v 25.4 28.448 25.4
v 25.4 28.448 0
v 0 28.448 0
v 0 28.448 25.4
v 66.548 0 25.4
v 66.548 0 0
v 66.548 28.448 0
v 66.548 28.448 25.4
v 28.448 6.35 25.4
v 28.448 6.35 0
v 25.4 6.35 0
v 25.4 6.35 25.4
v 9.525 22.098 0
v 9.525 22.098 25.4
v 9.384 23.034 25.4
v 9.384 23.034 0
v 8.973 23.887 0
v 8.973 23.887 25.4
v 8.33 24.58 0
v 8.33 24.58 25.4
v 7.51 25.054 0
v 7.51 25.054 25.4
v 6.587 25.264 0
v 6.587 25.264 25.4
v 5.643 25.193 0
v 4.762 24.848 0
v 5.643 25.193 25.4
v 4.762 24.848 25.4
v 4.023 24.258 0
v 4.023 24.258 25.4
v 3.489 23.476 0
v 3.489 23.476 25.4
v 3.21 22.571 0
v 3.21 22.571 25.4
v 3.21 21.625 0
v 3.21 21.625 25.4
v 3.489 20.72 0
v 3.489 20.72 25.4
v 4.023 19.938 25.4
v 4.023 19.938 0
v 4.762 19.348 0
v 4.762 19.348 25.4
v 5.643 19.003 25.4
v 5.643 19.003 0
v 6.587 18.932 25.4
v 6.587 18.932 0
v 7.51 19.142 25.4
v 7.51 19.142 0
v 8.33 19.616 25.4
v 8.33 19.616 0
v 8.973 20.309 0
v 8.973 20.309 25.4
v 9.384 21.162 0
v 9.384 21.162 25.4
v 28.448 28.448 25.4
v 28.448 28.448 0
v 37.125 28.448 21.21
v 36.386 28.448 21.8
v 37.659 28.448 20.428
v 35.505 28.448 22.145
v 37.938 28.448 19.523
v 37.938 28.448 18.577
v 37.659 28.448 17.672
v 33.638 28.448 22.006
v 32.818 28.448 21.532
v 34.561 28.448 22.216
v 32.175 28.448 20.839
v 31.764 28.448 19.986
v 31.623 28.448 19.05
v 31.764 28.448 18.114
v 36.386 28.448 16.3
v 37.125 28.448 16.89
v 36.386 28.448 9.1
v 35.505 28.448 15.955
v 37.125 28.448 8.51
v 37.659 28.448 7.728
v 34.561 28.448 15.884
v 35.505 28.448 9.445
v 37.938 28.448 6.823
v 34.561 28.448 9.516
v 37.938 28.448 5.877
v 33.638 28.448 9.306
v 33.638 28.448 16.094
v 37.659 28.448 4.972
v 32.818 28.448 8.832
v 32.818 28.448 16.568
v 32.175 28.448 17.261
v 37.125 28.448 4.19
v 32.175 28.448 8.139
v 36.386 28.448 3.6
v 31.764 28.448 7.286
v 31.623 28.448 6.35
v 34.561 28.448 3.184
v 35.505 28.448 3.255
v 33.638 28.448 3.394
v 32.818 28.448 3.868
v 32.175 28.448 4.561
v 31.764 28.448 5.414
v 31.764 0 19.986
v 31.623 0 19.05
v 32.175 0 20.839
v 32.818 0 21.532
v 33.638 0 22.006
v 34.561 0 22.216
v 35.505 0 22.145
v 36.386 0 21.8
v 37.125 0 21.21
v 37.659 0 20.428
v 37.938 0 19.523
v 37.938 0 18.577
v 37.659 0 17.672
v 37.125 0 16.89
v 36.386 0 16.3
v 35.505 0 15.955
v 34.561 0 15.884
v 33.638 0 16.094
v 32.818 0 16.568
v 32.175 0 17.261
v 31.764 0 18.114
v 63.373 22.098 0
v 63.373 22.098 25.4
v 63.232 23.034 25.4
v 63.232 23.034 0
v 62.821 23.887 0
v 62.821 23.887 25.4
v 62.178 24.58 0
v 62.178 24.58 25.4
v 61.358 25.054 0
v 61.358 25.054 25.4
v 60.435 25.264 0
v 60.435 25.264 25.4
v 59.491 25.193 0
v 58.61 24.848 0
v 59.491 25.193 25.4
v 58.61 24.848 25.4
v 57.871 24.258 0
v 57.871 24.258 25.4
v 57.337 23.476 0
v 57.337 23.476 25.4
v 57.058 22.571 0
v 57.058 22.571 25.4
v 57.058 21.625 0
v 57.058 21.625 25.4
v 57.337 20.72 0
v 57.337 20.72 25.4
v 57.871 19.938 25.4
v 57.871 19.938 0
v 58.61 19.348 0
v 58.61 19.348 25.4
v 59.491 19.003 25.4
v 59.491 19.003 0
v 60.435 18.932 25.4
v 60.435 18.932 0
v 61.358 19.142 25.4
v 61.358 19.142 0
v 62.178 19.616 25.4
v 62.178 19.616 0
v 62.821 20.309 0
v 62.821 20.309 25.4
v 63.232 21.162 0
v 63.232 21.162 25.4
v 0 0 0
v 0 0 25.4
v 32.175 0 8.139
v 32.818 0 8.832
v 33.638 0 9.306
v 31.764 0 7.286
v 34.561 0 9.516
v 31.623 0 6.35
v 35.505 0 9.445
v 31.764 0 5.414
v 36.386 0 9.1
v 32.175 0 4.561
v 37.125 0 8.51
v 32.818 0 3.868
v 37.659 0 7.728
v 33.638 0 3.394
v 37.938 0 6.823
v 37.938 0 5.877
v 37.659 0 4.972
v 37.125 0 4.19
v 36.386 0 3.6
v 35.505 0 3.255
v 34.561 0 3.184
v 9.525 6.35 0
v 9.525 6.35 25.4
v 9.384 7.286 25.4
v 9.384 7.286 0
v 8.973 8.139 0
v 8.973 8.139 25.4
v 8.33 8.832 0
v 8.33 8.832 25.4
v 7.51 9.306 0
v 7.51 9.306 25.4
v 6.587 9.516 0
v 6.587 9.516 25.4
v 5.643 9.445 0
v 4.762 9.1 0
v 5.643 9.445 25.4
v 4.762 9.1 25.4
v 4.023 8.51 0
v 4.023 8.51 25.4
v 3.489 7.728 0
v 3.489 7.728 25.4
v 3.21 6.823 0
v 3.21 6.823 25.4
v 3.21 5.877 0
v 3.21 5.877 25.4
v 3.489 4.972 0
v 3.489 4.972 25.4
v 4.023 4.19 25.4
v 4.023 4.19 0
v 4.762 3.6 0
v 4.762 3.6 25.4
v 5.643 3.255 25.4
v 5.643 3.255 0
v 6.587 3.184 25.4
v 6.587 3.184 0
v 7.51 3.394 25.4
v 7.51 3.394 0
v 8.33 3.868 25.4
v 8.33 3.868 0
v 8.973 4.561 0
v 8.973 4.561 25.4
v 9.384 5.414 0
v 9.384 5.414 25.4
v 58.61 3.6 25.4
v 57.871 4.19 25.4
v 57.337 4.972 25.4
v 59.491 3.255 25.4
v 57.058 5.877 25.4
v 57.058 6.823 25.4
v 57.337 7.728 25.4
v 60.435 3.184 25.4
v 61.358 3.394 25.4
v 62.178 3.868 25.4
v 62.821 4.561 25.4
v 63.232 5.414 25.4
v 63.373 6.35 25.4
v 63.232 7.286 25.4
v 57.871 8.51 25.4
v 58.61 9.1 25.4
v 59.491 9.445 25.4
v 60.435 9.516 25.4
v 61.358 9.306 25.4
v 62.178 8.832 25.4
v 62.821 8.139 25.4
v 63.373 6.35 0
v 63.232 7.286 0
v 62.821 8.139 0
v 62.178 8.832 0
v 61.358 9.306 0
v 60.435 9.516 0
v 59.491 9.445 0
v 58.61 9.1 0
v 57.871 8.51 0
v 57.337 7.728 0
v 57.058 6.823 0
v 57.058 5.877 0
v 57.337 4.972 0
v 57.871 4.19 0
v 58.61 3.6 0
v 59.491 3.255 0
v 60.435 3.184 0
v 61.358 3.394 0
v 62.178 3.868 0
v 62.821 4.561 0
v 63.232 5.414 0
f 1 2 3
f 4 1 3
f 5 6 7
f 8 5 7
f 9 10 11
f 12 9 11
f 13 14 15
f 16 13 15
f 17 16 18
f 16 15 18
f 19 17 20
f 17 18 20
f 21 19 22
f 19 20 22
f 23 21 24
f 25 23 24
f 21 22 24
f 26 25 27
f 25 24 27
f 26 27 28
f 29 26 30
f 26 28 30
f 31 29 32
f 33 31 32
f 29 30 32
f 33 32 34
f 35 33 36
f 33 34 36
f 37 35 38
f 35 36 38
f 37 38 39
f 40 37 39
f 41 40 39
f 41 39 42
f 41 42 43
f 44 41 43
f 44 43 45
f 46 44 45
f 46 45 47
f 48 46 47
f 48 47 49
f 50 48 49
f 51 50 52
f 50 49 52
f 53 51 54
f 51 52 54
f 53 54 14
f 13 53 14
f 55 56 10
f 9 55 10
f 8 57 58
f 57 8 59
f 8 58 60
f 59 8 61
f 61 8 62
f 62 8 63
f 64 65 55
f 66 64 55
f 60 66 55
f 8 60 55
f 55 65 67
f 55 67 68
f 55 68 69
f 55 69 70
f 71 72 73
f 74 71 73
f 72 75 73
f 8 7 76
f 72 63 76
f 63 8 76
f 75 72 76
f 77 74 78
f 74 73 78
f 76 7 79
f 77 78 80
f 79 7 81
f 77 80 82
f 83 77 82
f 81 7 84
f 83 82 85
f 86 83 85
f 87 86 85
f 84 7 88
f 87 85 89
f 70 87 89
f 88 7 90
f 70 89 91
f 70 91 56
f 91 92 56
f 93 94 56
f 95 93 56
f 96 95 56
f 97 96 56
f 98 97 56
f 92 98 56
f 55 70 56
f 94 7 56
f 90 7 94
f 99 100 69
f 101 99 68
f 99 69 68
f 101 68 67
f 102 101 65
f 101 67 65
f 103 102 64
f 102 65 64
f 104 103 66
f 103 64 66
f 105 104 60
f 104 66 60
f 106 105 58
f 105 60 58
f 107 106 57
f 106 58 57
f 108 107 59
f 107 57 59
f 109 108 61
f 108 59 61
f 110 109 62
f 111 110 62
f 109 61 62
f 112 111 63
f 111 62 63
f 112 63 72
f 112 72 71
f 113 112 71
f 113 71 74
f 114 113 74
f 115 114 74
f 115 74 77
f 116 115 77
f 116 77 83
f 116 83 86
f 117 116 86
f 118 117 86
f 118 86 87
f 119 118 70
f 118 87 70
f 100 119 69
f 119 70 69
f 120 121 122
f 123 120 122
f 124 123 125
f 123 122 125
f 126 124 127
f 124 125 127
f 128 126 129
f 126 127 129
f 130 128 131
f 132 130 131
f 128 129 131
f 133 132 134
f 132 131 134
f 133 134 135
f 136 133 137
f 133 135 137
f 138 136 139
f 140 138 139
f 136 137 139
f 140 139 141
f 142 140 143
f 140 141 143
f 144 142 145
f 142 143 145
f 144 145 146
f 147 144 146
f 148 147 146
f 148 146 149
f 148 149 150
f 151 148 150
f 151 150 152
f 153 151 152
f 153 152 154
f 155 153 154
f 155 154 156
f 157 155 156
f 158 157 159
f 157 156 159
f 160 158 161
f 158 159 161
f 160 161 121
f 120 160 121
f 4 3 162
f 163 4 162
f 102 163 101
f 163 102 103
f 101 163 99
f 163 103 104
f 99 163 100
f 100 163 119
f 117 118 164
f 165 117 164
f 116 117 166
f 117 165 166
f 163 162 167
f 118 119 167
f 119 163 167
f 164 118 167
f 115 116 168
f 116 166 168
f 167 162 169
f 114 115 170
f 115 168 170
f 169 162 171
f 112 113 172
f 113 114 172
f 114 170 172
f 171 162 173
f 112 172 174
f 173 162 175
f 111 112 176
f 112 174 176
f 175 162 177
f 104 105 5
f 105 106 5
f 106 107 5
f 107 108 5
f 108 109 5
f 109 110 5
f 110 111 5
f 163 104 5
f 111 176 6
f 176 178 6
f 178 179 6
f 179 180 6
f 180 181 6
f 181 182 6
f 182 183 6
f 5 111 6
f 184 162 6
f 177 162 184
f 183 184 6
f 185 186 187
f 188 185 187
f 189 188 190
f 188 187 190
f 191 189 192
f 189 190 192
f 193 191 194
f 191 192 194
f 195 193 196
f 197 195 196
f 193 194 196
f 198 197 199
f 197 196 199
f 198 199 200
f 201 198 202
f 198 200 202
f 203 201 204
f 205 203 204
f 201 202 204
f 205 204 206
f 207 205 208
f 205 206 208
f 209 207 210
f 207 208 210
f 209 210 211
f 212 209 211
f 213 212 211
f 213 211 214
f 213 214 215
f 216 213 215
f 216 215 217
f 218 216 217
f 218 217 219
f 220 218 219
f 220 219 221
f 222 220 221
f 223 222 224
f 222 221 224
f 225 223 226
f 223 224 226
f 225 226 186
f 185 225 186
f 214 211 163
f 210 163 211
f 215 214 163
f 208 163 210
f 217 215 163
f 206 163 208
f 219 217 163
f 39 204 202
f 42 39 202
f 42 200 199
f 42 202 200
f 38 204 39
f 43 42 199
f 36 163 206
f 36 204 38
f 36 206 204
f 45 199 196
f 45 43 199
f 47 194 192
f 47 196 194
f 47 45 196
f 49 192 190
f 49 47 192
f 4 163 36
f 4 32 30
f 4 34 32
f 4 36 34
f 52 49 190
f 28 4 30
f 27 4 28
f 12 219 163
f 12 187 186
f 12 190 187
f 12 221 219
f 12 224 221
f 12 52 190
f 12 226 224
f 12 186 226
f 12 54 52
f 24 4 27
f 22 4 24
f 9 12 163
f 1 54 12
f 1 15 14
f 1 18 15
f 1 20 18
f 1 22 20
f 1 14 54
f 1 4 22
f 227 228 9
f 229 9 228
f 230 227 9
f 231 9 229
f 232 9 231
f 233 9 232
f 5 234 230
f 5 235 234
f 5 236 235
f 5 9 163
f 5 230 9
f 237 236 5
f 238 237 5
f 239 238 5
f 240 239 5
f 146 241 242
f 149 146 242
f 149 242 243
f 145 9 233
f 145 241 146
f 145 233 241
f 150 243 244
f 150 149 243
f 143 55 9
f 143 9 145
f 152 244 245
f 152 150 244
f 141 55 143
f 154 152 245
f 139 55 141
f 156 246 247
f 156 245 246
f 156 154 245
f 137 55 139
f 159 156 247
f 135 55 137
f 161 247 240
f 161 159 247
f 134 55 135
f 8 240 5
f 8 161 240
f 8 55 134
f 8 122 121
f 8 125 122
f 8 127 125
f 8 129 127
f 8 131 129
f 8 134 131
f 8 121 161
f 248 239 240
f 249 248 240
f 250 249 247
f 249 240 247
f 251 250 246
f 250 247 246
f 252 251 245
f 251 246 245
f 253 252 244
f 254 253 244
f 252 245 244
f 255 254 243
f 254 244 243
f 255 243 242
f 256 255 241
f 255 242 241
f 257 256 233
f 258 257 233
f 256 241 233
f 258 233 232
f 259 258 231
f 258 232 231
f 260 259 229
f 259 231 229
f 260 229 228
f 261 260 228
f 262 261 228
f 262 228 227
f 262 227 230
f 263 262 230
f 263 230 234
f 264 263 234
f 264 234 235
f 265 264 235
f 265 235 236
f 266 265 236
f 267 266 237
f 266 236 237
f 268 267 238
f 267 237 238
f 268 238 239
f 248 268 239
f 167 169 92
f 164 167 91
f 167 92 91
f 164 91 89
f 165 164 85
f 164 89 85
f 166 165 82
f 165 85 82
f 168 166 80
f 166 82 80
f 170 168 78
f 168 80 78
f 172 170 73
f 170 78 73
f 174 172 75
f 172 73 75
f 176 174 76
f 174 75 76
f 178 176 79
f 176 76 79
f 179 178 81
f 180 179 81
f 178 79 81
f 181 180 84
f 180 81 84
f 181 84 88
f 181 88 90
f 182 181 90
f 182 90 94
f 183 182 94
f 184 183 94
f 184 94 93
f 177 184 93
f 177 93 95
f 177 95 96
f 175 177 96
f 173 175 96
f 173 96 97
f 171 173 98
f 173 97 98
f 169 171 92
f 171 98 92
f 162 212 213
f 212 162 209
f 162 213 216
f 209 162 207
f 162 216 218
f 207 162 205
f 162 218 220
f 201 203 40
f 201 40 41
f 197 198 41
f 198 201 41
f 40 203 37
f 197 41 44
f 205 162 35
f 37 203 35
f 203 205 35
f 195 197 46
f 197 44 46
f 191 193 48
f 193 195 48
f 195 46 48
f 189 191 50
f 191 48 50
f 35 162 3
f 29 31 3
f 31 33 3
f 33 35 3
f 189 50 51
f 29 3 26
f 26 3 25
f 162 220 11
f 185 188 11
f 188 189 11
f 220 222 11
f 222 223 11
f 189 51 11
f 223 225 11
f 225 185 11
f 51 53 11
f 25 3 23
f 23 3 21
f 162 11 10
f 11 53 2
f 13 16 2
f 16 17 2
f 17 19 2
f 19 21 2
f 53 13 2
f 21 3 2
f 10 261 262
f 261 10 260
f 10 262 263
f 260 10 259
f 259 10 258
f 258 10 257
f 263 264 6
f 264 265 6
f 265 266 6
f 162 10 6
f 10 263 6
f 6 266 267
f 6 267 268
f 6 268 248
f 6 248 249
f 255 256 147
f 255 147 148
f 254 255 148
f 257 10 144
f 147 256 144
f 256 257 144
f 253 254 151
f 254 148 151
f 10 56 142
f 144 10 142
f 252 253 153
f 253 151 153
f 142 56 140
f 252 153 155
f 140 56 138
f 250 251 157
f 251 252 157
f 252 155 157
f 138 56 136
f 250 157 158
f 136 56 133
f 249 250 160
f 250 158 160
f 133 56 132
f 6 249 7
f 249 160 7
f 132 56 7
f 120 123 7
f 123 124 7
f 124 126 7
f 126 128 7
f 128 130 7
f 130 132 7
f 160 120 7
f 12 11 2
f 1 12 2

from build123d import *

# Parameters (mm, degrees)
F1_DEPTH = 25.4
F2_R     = 3.175
F3_DEPTH = 25.4
F4_R     = 3.175
F5_DEPTH = 28.448


with BuildPart() as f1:
    # F0 (on Top) → F1 (new body)
    with BuildSketch(Plane.XY):
        Polygon((0, 28.448), (0, 0), (66.548, 0), (66.548, 28.448), (28.448, 28.448), (28.448, 6.35), (25.4, 6.35), (25.4, 28.448), align=None)
    extrude(amount=F1_DEPTH)

    # F2 (on face) → F3 (cut)
    with BuildSketch(Plane.XY.offset(25.4)):
        with Locations((6.35, 6.35)):
            Circle(F2_R)
        with Locations((60.198, 6.35)):
            Circle(F2_R)
        with Locations((60.198, 22.098)):
            Circle(F2_R)
        with Locations((6.35, 22.098)):
            Circle(F2_R)
    extrude(amount=-F3_DEPTH, mode=Mode.SUBTRACT)

    # F4 (on face) → F5 (cut, through all)
    with BuildSketch(Plane(origin=(0, 28.448, 0), x_dir=(-1, 0, 0), z_dir=(0, 1, 0))):
        with Locations((-34.798, 6.35)):
            Circle(F4_R)
        with Locations((-34.798, 19.05)):
            Circle(F4_R)
    extrude(amount=-F5_DEPTH, mode=Mode.SUBTRACT)


solid = f1.part
